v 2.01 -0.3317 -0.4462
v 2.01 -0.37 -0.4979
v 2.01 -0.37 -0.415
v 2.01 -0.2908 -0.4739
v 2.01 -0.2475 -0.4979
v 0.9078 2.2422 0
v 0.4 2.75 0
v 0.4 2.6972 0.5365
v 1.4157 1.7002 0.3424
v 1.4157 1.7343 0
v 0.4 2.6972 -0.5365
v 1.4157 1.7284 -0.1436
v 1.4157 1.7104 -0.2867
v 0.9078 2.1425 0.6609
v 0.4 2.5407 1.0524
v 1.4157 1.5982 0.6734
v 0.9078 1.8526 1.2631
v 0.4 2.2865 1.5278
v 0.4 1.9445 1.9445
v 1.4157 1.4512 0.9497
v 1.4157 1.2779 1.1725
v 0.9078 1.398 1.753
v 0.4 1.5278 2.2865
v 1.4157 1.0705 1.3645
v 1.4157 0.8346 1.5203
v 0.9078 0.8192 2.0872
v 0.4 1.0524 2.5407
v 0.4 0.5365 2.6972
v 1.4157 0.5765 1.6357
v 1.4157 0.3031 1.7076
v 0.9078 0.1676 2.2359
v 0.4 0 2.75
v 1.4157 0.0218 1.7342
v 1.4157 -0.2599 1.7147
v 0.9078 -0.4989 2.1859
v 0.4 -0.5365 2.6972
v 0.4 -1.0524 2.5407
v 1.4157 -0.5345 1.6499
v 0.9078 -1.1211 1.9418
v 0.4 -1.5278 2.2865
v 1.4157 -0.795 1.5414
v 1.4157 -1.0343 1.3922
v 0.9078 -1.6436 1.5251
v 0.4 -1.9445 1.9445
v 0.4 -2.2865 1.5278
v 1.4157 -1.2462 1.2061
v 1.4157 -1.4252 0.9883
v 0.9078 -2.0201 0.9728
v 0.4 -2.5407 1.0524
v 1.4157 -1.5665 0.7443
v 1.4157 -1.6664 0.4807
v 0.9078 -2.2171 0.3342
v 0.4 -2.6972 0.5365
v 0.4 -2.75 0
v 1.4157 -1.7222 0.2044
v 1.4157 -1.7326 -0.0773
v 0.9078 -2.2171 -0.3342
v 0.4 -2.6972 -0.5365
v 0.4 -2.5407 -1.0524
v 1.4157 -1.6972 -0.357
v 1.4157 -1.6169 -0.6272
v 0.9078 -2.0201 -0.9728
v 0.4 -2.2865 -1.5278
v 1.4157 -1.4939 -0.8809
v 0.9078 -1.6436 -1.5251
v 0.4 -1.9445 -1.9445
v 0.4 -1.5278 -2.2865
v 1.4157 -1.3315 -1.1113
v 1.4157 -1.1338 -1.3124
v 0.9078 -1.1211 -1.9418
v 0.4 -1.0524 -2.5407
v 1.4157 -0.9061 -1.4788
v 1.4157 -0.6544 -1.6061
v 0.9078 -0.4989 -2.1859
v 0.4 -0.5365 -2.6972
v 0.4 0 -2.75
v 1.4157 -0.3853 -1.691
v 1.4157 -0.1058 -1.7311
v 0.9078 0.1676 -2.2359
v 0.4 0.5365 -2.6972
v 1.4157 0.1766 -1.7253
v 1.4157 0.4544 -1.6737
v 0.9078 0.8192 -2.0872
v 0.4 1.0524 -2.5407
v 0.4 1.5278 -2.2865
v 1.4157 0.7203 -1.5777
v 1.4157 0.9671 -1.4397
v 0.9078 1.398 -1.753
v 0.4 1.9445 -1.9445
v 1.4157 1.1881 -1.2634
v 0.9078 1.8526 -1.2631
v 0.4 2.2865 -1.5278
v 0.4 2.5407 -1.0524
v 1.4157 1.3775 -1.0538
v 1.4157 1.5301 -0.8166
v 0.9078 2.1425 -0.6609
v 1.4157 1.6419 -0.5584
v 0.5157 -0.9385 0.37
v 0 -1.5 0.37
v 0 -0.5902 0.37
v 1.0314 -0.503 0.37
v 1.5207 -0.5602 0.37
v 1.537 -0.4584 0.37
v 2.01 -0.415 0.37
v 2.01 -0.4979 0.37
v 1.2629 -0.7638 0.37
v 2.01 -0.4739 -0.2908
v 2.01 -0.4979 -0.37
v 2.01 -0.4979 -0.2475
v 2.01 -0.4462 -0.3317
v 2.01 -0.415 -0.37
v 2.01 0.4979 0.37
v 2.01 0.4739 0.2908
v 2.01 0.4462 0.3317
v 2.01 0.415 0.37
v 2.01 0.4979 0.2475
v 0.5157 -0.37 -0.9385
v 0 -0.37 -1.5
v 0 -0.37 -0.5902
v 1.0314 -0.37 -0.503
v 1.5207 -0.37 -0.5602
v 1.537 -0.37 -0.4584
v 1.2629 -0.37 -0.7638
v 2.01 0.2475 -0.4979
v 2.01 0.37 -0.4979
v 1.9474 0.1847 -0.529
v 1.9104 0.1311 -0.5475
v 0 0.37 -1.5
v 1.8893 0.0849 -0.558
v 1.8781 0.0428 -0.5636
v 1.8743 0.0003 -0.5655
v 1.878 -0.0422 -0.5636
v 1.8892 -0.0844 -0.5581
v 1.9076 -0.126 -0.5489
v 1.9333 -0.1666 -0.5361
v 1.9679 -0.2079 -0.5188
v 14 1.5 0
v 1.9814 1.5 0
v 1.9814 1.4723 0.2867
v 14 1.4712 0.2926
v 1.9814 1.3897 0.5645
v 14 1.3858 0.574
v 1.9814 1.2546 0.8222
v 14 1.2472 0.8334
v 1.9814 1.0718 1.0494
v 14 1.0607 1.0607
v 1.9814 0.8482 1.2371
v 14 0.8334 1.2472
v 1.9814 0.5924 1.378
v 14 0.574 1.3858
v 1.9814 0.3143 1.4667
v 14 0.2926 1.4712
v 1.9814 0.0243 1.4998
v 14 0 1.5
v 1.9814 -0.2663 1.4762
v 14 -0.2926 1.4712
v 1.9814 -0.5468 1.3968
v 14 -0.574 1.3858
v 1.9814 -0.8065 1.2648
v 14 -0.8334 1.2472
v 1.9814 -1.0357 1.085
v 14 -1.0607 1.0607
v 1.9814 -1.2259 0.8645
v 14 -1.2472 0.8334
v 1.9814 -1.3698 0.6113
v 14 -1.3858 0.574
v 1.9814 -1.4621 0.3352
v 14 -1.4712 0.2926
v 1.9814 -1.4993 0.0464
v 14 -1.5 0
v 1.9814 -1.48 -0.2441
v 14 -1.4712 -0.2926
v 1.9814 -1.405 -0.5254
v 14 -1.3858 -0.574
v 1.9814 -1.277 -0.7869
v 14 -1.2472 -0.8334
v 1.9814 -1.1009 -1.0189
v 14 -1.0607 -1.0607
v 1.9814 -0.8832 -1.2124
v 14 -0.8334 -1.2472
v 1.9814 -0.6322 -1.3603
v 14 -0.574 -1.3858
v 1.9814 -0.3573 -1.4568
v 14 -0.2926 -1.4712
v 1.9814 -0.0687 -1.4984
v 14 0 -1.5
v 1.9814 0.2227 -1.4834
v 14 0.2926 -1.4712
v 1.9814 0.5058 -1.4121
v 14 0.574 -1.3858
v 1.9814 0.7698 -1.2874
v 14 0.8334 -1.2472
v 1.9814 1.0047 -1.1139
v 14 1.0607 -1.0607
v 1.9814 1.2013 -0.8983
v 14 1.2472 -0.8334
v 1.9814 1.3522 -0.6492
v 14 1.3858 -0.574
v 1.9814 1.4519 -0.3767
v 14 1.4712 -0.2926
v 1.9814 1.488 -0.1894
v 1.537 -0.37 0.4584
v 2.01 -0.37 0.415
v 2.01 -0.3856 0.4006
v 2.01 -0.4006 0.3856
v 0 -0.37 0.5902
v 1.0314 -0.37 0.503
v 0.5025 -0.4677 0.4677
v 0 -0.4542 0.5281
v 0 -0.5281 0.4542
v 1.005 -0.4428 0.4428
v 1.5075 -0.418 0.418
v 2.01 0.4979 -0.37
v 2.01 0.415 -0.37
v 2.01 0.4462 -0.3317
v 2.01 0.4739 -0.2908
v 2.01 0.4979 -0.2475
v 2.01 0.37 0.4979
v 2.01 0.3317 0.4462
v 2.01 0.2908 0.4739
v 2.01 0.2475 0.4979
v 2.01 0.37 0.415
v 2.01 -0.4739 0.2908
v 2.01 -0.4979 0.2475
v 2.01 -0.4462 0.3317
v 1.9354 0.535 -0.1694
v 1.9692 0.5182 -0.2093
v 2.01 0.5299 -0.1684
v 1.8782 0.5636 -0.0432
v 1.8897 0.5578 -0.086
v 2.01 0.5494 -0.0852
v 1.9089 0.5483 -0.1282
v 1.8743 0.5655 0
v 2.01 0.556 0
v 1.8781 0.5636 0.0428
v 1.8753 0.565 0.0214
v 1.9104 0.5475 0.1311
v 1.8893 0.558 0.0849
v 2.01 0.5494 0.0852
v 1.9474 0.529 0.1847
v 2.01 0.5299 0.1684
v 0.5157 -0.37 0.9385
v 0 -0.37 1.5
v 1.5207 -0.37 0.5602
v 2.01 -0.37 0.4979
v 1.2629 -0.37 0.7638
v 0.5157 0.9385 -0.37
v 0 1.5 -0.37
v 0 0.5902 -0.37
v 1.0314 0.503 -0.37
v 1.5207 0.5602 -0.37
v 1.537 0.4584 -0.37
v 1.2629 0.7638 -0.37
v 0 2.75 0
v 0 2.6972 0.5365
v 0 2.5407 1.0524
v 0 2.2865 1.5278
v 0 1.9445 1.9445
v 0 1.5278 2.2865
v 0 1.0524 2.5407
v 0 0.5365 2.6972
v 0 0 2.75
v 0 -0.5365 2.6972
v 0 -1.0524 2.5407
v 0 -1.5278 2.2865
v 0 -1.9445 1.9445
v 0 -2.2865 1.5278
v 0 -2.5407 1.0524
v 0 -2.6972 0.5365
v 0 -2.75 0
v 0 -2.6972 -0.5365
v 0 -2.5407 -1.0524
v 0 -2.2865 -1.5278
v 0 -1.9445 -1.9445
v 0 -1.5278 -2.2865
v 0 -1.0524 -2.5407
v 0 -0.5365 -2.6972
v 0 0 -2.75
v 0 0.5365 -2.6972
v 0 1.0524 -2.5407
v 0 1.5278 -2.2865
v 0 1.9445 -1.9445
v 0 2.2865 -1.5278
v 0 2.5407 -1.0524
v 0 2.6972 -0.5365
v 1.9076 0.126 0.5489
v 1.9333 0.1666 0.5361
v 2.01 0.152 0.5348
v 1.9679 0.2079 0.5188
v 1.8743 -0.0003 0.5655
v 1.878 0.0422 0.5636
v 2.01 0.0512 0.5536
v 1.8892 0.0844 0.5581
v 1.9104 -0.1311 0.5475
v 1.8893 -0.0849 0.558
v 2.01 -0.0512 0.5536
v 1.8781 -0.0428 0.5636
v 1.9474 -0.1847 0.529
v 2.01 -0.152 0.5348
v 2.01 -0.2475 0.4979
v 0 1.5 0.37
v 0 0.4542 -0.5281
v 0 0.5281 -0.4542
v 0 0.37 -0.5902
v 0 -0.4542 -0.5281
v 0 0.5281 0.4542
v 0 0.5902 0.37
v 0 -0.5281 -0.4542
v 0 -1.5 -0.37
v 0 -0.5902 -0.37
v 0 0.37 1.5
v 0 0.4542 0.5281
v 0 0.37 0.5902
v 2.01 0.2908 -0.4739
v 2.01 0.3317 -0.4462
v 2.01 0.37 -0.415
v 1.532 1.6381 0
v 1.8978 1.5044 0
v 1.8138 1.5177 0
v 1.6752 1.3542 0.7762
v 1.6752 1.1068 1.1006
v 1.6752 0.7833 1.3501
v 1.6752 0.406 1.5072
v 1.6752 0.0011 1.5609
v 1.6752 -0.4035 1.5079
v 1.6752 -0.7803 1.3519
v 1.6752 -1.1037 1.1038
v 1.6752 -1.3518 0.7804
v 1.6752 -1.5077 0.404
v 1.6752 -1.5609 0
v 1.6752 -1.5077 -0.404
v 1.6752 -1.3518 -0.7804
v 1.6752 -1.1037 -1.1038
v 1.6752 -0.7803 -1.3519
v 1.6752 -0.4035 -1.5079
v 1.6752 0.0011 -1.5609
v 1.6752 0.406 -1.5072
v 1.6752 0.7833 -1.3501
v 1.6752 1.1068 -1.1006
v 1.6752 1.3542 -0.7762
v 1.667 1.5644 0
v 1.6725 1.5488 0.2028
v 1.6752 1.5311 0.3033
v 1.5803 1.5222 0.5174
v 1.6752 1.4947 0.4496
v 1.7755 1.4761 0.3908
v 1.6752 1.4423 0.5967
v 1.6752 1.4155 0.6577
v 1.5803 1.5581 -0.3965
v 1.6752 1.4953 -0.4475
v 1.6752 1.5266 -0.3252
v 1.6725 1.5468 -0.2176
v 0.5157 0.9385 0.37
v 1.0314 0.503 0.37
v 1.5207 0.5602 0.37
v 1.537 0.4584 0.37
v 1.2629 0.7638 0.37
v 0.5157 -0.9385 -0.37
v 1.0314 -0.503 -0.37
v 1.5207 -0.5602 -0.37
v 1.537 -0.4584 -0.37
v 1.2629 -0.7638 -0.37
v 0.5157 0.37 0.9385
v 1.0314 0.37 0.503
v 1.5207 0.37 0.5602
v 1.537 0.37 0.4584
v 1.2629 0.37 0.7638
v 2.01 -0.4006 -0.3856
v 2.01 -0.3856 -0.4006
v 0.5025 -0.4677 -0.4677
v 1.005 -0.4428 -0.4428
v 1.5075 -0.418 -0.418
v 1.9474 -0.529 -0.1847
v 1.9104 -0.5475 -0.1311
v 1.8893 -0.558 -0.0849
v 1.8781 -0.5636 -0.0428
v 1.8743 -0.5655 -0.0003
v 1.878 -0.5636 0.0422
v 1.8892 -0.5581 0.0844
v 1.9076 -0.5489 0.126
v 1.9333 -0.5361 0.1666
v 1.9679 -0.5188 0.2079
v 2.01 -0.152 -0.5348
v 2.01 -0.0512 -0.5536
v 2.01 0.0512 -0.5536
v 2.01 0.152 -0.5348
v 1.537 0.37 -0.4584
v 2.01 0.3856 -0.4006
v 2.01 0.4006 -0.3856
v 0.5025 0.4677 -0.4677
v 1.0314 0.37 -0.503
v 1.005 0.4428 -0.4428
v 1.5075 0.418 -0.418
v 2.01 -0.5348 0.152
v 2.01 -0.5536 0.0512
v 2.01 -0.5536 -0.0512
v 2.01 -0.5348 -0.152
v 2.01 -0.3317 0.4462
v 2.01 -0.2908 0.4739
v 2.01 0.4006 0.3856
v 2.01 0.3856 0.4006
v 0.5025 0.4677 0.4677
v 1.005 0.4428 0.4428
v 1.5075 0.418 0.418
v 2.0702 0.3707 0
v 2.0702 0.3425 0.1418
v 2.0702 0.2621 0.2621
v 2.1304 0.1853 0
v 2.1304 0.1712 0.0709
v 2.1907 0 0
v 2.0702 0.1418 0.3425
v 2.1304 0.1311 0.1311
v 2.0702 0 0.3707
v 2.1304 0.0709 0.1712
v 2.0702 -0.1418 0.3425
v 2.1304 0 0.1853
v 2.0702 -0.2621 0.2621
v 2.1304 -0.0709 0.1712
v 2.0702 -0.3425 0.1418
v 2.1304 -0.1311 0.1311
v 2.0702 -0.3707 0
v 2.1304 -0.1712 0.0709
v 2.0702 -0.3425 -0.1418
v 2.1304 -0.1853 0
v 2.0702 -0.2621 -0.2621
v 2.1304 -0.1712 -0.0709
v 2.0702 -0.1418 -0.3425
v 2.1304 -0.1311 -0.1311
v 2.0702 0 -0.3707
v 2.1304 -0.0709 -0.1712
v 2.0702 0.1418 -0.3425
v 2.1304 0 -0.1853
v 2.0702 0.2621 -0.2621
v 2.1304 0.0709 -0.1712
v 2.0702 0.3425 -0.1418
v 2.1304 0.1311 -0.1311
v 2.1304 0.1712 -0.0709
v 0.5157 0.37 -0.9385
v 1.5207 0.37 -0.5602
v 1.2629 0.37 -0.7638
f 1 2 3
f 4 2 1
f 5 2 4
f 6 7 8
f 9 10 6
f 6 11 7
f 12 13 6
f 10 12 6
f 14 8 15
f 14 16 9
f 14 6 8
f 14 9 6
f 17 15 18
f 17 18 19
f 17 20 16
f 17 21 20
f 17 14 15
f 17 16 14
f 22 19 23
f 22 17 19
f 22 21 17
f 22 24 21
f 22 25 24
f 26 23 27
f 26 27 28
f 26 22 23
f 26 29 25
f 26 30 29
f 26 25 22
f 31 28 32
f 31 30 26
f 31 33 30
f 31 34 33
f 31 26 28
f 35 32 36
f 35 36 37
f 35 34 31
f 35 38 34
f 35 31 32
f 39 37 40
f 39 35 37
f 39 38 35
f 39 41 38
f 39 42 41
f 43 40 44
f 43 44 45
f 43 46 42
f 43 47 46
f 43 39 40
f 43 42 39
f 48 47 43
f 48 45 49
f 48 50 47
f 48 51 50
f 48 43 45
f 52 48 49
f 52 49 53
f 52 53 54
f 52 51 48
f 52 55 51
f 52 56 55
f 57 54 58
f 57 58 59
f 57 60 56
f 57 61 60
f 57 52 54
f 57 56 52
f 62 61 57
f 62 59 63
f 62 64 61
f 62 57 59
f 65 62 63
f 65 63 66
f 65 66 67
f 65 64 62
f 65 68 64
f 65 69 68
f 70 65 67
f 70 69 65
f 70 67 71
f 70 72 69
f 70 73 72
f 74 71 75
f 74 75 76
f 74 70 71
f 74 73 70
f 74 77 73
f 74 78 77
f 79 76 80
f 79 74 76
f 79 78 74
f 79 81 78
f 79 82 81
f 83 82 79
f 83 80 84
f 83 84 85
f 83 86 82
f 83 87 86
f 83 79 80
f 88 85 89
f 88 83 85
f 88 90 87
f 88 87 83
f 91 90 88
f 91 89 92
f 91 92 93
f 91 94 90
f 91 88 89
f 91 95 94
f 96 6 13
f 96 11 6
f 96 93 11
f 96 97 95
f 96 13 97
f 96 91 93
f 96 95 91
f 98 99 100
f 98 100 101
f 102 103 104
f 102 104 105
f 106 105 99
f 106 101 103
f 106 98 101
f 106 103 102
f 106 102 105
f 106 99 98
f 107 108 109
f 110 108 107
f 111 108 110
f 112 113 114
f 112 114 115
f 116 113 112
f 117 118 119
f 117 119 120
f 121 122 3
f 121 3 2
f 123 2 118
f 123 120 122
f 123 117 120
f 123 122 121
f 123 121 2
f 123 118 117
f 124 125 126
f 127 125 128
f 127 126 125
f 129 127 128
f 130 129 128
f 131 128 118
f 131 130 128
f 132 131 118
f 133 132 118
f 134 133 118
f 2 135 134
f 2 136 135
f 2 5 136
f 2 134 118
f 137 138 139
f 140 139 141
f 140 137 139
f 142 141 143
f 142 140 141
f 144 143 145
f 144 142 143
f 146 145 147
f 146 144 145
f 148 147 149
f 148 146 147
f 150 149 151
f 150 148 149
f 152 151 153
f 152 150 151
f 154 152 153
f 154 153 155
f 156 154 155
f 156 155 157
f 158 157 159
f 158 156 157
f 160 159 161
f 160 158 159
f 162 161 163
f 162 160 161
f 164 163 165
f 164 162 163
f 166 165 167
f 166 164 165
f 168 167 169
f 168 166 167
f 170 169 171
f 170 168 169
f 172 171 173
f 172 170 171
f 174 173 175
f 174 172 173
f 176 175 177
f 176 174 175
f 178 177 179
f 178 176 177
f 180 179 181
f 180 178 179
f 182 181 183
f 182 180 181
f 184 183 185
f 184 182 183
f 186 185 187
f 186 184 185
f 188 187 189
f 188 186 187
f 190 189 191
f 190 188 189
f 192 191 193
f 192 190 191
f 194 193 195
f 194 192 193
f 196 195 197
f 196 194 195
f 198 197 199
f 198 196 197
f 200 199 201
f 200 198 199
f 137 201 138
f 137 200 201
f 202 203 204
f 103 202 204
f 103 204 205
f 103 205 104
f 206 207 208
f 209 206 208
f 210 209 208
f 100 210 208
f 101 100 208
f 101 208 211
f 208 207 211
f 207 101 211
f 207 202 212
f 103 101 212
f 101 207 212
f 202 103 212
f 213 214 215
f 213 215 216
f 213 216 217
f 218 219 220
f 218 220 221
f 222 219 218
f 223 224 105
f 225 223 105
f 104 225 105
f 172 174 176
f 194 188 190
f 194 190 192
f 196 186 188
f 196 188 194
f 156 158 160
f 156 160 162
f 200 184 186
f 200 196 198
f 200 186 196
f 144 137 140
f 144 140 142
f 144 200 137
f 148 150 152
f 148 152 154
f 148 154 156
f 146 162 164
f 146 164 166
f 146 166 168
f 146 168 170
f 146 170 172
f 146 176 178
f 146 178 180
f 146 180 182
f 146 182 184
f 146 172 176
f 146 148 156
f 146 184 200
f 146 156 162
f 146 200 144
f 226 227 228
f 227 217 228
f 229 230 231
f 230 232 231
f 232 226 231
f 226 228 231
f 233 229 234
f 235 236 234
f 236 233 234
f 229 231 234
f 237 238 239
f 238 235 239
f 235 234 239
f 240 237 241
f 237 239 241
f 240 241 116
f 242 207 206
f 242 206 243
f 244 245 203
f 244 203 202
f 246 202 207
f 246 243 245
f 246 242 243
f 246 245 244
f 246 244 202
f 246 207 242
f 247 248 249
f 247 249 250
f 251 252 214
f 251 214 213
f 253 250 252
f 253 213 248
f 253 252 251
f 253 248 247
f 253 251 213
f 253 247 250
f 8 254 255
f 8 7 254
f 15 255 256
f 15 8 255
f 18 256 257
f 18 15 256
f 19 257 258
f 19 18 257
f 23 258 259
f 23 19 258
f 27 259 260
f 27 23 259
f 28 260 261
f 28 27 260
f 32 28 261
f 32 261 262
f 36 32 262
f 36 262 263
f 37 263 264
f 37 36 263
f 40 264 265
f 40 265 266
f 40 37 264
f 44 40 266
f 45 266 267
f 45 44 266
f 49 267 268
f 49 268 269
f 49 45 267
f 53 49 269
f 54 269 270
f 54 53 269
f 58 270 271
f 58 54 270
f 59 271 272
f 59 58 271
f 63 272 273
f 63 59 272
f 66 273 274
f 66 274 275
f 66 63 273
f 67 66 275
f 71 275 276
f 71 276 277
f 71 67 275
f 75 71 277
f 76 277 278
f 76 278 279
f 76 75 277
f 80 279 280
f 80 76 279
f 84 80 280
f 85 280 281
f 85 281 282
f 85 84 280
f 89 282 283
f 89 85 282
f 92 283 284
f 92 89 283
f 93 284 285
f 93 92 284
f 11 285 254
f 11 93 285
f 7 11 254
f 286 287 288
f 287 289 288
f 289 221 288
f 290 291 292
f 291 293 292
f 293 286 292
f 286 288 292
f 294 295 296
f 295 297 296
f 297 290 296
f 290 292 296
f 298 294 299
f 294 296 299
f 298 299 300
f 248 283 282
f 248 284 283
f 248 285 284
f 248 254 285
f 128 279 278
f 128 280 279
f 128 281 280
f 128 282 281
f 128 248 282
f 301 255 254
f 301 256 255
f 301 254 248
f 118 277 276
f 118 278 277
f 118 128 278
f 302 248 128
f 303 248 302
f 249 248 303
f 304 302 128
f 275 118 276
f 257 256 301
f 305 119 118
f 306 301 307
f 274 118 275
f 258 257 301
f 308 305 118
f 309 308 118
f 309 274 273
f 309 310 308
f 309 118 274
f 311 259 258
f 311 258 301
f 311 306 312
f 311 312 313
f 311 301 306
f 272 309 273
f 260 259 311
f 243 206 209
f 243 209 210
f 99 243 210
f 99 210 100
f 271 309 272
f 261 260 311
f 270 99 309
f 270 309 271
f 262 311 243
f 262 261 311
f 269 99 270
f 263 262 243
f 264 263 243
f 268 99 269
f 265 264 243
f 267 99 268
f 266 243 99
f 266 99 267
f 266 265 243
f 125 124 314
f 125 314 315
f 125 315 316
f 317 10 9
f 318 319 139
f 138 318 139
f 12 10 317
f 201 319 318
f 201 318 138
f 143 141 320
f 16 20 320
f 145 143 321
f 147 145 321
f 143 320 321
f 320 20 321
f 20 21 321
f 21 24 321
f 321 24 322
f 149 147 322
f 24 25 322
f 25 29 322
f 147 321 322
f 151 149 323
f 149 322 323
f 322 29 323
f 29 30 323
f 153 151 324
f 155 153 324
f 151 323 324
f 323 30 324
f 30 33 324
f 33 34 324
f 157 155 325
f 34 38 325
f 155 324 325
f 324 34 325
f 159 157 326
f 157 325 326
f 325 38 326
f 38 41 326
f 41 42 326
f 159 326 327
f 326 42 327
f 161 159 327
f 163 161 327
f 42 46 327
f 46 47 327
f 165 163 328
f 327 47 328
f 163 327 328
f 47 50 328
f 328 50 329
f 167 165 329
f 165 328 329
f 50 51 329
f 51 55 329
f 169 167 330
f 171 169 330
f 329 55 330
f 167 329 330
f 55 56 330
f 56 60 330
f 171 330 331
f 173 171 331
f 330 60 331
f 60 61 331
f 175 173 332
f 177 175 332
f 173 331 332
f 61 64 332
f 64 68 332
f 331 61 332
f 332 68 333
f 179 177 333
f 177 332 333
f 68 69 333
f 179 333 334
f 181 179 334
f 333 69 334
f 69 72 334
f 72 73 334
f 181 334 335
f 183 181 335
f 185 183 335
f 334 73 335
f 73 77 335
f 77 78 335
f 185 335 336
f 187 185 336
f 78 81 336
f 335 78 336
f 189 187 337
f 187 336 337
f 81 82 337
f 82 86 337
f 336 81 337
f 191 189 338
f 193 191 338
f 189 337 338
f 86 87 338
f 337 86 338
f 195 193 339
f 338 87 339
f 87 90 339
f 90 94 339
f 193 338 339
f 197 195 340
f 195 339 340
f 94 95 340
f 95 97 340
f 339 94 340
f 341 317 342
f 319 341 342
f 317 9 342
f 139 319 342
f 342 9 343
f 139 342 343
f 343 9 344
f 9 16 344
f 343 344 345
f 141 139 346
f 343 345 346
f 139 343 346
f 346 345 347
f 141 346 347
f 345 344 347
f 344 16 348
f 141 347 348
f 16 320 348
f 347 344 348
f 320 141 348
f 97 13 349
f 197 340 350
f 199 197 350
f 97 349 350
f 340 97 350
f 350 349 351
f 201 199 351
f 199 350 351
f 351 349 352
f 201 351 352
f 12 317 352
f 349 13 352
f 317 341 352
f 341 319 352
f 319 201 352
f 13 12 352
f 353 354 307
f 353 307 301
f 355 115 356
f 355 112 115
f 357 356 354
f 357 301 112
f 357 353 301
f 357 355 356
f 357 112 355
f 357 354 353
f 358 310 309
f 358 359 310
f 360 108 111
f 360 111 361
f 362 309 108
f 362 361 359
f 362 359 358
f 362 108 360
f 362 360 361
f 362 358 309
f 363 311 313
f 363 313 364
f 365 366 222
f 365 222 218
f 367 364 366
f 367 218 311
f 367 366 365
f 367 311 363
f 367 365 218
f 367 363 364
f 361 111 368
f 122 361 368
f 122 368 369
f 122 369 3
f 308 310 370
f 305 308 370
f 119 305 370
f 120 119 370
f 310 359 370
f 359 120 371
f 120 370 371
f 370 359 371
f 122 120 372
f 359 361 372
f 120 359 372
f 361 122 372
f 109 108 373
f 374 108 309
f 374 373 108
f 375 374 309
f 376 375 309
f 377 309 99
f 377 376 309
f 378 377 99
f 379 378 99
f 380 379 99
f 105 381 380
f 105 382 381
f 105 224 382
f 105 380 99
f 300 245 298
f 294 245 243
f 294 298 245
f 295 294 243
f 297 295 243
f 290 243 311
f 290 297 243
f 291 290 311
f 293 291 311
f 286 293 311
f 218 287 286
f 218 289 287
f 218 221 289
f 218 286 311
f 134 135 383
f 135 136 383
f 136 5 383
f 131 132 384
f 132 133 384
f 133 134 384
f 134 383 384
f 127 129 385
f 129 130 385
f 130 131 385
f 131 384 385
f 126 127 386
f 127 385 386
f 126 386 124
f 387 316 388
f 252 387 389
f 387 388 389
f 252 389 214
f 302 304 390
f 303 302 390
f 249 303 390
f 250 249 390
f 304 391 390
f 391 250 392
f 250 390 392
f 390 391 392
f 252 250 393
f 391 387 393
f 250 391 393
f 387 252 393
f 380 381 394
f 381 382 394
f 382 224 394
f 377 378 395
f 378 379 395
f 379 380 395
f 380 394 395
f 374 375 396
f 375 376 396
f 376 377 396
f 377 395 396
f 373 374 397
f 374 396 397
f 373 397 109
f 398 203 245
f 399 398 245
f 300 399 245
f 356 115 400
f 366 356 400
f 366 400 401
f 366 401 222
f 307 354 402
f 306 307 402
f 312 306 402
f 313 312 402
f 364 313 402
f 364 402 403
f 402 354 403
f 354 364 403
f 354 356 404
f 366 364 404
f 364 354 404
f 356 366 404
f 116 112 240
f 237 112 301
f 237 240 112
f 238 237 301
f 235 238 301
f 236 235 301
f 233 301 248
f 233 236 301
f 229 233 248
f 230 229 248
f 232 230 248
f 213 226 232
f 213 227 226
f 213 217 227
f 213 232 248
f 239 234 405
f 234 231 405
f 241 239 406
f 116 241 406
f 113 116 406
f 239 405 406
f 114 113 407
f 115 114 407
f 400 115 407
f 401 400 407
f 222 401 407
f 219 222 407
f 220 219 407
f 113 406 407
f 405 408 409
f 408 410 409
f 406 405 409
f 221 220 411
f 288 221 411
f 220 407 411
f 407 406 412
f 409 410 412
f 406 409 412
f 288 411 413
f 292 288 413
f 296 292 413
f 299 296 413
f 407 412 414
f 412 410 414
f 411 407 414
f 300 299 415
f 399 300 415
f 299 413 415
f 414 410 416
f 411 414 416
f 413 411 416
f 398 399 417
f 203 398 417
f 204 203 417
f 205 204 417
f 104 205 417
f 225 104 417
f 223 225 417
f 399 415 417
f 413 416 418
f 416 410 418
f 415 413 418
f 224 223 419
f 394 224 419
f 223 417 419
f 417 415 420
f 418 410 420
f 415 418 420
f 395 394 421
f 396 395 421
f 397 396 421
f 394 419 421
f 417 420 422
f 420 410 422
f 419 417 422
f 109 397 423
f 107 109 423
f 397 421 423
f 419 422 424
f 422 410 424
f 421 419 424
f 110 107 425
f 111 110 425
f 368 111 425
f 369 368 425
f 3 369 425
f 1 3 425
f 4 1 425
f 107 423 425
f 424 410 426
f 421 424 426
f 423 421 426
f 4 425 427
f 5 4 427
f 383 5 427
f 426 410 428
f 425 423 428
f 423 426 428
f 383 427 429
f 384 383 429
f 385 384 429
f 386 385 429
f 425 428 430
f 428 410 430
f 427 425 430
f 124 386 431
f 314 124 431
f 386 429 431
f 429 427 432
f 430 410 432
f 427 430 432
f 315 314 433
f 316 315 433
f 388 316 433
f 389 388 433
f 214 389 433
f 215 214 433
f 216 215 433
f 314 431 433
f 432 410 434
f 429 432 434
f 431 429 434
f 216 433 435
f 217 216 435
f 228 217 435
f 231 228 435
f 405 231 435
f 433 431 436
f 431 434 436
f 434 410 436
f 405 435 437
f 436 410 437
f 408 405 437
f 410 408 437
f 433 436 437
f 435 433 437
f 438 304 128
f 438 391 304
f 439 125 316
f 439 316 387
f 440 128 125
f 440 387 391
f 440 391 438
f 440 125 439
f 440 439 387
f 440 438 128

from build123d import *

# Parameters (mm, degrees)
FILLET1_R    = 0.8
SKETCH3_W    = 0.74
SKETCH3_H    = 3
SKETCH4_W    = 0.74
SKETCH4_H    = 0.99570227
RECPAT_COUNT = 2
RECPAT_ANGLE = 90


with BuildPart() as part:
    # BodySke → Base-Revolve (revolve)
    with BuildSketch(Plane.XY):
        Polygon((0, 0), (0, 2.75), (0.4, 2.75), (1.65, 1.5), (14, 1.5), (14, 0), align=None)
    revolve(axis=Axis((-6.35, 0, 0), (1, 0, 0)))

    # Fillet1
    fillet1_edges = [part.edges().sort_by_distance(p)[0] for p in [
        (1.65, -1.5, 0),
    ]]
    fillet(fillet1_edges, radius=FILLET1_R)

    # Sketch3 → Recess section 0
    with BuildSketch(Plane.ZY):
        Rectangle(SKETCH3_W, SKETCH3_H)
    # Sketch4 → Recess section 1
    with BuildSketch(Plane.ZY.offset(-2.01)):
        Rectangle(SKETCH4_W, SKETCH4_H)
    recess = loft(mode=Mode.SUBTRACT)

    # RecPat: Recess ×2 about axis
    recpat_axis = Axis((0, 0, 0), (1, 0, 0))
    for i in range(1, RECPAT_COUNT):
        add(recess.rotate(recpat_axis, i * RECPAT_ANGLE / (RECPAT_COUNT - 1)), mode=Mode.SUBTRACT)

    # RecCorSke → RecessCore (revolve, cut)
    with BuildSketch(Plane.XY):
        Polygon((0, 0), (0, 0.696552892), (2.01, 0.556), (2.190655351, 0), align=None)
    revolve(axis=Axis((-3.175, 0, 0), (1, 0, 0)), mode=Mode.SUBTRACT)


solid = part.part
